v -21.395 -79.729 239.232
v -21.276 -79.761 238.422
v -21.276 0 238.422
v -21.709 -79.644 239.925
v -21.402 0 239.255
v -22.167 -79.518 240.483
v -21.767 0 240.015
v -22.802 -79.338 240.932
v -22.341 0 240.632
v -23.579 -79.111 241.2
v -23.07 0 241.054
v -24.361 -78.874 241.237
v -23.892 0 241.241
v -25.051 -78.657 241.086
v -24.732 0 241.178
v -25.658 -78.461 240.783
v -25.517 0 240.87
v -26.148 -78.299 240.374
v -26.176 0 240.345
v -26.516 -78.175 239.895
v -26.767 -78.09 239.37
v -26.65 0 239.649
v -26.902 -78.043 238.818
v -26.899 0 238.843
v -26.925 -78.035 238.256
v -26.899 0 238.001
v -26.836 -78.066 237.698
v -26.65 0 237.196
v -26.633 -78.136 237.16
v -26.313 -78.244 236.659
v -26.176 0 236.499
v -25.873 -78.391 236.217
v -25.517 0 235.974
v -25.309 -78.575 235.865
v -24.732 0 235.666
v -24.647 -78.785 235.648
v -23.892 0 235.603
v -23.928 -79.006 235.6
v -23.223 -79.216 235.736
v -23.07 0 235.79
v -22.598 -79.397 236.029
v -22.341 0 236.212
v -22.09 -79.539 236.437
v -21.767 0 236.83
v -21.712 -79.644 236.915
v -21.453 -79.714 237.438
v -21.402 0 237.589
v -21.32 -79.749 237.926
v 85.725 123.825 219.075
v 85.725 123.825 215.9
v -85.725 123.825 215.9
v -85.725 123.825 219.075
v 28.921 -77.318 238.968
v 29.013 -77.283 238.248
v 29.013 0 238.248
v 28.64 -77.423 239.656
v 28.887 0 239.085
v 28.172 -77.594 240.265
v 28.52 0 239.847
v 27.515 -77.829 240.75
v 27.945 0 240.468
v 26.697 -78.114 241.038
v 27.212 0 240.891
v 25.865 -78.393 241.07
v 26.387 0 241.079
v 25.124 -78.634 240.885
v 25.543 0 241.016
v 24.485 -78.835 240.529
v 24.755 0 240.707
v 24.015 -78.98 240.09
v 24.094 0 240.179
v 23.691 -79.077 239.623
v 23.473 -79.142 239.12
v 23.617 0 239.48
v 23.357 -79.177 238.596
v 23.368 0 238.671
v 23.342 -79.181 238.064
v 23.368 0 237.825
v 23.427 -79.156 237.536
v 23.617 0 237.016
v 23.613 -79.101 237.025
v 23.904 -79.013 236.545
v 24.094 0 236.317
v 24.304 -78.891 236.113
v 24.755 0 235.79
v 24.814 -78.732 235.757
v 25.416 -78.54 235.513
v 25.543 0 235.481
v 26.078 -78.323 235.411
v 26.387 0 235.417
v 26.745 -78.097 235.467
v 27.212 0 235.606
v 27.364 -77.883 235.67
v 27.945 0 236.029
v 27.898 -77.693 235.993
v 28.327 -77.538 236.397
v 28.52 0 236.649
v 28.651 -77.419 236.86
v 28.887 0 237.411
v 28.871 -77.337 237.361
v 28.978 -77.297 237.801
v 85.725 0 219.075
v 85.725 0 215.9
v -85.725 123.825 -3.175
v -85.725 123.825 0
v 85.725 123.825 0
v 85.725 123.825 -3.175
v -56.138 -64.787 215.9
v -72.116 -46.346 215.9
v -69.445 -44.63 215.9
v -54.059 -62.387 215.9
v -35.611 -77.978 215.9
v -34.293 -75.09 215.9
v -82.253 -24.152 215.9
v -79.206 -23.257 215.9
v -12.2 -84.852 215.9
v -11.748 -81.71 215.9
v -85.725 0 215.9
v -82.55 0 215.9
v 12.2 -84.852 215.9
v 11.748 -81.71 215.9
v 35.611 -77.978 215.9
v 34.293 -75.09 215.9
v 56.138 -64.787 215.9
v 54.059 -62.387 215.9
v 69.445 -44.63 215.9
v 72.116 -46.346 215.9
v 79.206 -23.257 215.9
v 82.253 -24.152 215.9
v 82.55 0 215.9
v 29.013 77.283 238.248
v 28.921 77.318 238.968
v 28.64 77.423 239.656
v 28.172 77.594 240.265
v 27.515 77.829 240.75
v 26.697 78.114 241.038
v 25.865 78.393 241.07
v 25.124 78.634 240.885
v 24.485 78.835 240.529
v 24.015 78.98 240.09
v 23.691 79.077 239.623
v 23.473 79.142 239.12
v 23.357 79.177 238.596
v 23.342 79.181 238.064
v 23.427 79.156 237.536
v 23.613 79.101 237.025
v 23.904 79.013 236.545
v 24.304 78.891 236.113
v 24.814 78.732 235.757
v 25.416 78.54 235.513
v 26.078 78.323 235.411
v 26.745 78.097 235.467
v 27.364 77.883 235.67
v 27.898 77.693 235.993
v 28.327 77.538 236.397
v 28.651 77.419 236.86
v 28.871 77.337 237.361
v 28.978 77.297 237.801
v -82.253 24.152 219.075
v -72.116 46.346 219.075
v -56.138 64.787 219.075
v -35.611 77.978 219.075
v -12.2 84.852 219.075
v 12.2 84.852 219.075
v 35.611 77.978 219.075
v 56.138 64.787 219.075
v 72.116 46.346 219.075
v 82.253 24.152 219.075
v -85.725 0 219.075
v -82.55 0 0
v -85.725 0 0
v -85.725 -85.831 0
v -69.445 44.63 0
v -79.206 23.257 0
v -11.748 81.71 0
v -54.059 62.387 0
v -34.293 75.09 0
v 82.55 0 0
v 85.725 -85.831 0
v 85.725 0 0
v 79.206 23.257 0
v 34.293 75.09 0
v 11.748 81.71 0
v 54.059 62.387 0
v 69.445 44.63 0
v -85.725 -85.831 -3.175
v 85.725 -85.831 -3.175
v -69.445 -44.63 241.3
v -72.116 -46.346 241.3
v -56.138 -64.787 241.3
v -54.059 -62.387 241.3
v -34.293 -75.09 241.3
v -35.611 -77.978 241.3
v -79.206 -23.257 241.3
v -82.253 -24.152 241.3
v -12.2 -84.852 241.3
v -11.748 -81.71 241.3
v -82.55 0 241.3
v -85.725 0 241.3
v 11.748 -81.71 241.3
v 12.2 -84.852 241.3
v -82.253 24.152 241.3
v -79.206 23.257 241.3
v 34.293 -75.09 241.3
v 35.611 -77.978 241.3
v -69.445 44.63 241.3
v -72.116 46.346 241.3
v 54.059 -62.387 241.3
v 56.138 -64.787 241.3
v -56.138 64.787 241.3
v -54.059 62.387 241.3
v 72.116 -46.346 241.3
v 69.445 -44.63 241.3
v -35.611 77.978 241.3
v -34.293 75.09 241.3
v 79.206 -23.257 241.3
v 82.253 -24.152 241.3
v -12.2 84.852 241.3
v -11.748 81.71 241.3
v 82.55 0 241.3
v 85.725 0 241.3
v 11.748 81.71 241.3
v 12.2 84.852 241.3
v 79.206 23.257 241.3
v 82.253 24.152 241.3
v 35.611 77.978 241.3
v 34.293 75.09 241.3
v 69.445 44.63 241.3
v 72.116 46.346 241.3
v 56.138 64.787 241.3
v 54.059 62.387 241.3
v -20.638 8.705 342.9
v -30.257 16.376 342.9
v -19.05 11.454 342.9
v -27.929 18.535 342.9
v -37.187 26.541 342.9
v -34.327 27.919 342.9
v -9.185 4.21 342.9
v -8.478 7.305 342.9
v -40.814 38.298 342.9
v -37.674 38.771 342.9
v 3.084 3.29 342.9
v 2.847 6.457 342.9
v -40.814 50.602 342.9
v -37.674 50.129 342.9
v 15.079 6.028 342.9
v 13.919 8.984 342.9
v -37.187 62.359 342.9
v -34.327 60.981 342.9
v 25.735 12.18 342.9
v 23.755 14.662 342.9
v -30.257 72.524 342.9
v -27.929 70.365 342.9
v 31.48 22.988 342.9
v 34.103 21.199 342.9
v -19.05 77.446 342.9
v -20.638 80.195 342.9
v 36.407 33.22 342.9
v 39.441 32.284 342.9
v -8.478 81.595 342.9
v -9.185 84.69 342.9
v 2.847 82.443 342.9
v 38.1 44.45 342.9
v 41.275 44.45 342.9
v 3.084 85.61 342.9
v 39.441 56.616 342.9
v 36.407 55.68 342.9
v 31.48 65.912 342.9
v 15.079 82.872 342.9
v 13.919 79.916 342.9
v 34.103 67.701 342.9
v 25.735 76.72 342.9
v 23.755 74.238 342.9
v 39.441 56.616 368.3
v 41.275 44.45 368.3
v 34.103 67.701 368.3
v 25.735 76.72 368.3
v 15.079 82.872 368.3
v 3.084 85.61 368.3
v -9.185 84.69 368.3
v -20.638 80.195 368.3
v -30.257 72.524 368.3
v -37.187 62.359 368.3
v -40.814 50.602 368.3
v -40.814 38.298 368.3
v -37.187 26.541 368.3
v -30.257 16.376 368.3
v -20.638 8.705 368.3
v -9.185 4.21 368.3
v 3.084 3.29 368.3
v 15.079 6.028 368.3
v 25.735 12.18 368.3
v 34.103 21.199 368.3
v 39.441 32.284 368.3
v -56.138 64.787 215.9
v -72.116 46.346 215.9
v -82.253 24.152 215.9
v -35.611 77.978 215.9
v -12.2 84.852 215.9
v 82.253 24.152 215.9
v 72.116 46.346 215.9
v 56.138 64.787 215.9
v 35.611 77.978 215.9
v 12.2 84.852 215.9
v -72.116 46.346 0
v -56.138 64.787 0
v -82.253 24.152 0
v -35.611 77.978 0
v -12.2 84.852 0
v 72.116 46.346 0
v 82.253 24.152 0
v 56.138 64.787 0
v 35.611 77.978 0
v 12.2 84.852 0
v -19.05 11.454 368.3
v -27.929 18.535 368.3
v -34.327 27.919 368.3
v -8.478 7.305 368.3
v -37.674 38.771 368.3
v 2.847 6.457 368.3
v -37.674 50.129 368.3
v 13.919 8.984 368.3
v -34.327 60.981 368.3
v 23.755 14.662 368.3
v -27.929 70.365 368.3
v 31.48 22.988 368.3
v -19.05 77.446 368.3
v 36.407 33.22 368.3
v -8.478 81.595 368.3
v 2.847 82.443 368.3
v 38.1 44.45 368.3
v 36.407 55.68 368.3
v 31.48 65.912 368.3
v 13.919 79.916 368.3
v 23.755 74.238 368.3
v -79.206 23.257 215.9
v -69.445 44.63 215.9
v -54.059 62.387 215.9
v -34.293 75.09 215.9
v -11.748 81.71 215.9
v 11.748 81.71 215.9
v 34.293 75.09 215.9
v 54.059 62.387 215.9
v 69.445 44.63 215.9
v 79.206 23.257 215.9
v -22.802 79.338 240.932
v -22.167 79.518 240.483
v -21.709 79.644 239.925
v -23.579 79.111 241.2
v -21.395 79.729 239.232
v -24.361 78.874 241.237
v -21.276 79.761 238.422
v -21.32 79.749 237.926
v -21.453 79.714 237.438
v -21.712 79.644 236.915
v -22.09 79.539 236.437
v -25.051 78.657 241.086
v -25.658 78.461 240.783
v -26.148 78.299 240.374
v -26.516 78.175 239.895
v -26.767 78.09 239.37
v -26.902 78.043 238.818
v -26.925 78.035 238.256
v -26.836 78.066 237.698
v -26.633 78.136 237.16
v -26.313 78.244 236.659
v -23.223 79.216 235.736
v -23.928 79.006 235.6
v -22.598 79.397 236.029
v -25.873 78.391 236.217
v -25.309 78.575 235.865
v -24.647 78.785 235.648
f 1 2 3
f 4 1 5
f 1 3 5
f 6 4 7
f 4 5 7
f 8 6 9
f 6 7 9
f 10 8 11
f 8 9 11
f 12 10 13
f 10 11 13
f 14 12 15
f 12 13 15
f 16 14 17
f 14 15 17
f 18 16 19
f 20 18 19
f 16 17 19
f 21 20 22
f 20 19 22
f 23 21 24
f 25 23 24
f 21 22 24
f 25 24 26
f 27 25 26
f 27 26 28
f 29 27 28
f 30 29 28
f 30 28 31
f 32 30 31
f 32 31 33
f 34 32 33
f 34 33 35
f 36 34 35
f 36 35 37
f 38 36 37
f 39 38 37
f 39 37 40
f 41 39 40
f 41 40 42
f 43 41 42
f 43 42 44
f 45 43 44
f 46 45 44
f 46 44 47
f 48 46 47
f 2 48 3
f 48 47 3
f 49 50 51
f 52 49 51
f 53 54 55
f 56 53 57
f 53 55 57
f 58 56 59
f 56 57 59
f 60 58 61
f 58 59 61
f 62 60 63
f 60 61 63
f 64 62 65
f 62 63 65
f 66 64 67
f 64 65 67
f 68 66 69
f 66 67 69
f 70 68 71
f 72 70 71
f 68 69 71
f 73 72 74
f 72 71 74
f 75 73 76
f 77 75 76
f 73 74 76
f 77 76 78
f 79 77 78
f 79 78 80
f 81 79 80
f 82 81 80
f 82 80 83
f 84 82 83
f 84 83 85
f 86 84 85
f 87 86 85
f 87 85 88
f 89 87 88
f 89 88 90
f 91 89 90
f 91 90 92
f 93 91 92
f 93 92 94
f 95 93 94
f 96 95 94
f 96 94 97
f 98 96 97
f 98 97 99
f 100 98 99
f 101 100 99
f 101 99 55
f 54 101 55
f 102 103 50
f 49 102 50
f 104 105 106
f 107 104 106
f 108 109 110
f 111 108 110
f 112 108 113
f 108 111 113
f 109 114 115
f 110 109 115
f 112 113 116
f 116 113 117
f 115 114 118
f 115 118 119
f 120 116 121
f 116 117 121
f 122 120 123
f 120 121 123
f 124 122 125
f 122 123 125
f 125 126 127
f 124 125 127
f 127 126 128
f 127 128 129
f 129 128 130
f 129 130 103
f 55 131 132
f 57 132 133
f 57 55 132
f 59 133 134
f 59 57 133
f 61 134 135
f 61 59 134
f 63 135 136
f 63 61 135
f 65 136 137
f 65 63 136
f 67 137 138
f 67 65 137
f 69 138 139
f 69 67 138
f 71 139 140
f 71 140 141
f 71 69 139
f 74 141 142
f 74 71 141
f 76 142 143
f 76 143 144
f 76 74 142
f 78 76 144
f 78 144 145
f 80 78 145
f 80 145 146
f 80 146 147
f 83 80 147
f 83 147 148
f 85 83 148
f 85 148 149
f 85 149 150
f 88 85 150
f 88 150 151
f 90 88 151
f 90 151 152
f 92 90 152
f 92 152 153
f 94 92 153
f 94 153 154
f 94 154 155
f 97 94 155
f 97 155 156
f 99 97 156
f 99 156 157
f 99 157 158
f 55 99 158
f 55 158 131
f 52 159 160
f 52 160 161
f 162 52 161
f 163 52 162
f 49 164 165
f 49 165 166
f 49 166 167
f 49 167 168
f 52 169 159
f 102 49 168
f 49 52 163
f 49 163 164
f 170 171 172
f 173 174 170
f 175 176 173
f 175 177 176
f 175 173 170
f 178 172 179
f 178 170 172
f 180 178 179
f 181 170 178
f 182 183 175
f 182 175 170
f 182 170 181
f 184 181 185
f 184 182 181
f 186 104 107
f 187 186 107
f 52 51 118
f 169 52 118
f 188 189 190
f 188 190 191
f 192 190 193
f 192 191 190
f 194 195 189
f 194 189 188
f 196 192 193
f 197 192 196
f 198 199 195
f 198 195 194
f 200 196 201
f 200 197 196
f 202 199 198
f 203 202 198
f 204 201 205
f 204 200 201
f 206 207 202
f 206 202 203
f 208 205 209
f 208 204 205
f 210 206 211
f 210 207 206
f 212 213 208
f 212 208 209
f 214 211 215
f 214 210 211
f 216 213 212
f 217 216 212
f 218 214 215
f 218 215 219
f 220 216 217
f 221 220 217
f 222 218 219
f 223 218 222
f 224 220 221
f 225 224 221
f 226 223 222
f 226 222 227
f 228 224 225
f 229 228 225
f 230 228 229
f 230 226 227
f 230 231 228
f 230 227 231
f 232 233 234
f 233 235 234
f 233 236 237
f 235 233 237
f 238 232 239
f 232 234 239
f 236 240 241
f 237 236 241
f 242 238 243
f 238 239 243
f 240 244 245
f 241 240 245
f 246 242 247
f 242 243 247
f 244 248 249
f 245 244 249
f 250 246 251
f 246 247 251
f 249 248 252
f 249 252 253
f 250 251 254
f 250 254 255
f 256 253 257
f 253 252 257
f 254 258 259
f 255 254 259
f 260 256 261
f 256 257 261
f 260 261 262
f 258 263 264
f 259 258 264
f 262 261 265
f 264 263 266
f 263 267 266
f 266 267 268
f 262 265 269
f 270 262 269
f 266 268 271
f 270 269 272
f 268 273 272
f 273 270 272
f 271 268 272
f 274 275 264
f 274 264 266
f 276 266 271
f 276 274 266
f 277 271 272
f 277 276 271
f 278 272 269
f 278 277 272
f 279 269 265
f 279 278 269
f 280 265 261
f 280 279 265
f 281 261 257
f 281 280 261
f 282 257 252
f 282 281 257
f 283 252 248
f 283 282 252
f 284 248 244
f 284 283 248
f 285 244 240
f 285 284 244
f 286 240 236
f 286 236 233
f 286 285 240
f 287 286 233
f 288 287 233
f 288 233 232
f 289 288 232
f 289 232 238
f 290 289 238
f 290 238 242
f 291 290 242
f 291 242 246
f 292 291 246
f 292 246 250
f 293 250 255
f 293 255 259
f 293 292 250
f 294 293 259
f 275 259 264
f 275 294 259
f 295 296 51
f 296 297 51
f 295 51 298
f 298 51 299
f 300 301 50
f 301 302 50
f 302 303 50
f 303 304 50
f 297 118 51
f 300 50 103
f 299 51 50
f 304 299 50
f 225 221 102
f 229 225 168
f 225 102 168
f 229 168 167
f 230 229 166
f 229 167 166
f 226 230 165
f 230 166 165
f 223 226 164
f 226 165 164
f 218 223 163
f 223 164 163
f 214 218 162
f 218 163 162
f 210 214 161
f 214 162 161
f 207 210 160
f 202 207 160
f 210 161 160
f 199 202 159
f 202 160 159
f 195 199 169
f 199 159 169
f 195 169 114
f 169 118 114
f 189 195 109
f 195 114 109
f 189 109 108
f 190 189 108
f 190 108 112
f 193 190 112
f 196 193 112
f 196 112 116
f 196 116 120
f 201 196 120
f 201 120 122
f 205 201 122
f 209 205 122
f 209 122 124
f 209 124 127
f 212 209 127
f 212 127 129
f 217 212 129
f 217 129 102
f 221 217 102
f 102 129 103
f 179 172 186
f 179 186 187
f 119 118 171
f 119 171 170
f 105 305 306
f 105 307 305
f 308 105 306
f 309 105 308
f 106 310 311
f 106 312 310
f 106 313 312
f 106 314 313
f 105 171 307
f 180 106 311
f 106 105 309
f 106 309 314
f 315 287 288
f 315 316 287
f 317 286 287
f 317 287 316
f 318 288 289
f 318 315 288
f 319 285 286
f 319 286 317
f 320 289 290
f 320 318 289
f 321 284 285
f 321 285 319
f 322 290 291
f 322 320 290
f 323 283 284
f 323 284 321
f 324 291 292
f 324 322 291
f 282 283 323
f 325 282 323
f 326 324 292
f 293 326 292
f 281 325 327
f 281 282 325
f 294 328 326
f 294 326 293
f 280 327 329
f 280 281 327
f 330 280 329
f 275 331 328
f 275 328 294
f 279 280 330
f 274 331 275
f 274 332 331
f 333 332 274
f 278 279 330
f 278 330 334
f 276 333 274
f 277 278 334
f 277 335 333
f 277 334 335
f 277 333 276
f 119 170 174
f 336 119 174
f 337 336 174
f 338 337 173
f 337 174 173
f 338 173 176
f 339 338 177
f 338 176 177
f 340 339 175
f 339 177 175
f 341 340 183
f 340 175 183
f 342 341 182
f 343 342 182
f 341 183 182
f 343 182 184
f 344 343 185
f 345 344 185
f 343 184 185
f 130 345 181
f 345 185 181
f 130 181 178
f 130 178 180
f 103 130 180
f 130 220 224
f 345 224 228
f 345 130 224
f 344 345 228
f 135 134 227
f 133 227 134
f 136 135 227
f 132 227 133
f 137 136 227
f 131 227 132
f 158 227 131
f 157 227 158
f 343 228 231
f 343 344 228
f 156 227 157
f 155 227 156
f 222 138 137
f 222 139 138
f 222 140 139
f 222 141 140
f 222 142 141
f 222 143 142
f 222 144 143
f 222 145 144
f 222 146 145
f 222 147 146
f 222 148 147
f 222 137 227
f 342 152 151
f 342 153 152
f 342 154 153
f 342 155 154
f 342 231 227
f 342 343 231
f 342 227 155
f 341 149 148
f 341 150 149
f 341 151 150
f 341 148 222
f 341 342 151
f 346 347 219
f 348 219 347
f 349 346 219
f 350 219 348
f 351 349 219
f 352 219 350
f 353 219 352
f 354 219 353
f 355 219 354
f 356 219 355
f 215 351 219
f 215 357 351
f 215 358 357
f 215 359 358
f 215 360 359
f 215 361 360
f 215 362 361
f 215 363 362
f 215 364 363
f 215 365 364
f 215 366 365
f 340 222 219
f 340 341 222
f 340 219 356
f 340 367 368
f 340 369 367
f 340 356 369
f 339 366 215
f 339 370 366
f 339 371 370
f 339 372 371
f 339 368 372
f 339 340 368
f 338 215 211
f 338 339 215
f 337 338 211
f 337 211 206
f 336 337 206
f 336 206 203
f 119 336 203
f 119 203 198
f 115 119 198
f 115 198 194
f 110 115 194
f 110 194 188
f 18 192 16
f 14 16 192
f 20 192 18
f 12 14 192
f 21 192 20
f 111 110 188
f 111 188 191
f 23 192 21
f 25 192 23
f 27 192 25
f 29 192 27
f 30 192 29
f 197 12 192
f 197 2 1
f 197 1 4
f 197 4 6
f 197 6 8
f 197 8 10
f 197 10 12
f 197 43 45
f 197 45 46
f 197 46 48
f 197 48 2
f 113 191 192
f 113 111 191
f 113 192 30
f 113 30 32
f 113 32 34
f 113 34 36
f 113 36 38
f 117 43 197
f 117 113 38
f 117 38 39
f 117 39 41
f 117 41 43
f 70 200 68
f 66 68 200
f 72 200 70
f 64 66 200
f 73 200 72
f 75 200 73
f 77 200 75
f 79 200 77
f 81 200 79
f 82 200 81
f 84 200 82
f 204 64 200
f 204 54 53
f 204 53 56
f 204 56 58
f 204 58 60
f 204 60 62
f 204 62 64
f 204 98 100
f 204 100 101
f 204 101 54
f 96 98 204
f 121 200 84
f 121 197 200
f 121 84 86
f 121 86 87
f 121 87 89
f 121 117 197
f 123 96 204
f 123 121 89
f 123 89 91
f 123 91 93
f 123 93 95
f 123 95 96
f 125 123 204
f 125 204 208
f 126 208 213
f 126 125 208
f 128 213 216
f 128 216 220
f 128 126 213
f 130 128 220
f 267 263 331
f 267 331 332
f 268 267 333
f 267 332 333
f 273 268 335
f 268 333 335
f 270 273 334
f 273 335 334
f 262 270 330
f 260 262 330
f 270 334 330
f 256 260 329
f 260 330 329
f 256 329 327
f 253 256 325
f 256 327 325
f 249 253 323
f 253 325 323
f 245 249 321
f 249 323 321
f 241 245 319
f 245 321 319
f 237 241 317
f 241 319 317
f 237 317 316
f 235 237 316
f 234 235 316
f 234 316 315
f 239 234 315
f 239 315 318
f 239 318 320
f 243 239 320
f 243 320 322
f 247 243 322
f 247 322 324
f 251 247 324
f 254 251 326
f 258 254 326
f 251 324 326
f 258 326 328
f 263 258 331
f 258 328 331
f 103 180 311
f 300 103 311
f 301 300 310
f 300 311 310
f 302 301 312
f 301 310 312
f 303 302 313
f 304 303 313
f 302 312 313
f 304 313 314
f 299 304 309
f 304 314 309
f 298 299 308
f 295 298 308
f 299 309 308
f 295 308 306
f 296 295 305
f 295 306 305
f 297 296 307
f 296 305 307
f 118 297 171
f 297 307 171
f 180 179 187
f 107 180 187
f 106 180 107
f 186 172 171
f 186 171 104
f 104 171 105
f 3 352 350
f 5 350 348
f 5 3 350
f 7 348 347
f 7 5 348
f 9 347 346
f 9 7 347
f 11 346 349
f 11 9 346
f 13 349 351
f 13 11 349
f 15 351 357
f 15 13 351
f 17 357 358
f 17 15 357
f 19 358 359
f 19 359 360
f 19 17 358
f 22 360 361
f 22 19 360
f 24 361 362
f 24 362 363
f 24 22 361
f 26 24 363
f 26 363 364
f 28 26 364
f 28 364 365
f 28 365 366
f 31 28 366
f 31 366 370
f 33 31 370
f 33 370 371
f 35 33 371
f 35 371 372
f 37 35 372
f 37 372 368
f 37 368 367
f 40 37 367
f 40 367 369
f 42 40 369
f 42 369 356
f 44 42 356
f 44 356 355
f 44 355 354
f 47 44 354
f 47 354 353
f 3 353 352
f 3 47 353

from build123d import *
from build123d import SkipClean  # not in build123d's __all__

# Parameters (mm, degrees)
F1_DEPTH       = 215.9
F2_W           = 171.45
F2_H           = 247.65
F3_DEPTH       = 3.175
F4_W           = 171.45
F4_H           = 37.9944009304
F5_DEPTH       = 25.4
F7_R           = 85.725
F7_R_2         = 82.55
F9_DEPTH       = 25.4
F10_R          = 41.275
F10_R_2        = 38.1
F11_DEPTH      = 25.4
F13_DEPTH      = 3.175
F14_R          = 2.8270786392
F14_R_2        = 2.8387354089
F15_DEPTH      = 79.7610810168
F15_DEPTH_BACK = 79.7610810168


# Not quite as in the source:
# - after a boolean that leaves OpenCascade's solid faulty, fix() repairs it


with BuildPart() as f1:
    # F0 (on Top) → F1 (new body)
    with BuildSketch(Plane.XY):
        with BuildLine():
            ThreePointArc((-82.55, 0), (0, 82.55), (82.55, 0))
            Line((82.55, 0), (85.725, 0))
            ThreePointArc((85.725, 0), (0, 85.725), (-85.725, 0))
            Line((-85.725, 0), (-82.55, 0))
        make_face()
    extrude(amount=F1_DEPTH)

    # F2 (on Top) → F3 (join)
    with BuildSketch(Plane.XY):
        Rectangle(F2_W, F2_H)
    extrude(amount=-F3_DEPTH)

    # F4 (on face) → F5 (cut)
    with BuildSketch(Plane.XY):
        with Locations((0, -104.8277995348)):
            Rectangle(F4_W, F4_H)
    extrude(amount=-F5_DEPTH, mode=Mode.SUBTRACT)

    # F7 (on offset) → F9 (join)
    with BuildSketch(Plane.XY.offset(215.9)):
        Circle(F7_R)
        Circle(F7_R_2, mode=Mode.SUBTRACT)
    with SkipClean():  # cleaning this boolean's faces spoils the solid; the shape is the same uncleaned
        extrude(amount=F9_DEPTH)

    # F12 (on offset) → F13 (join)
    with BuildSketch(Plane.XY.offset(215.9)):
        with BuildLine():
            Line((-85.725, 123.825), (-85.725, 0))
            ThreePointArc((-85.725, 0), (0, 85.725), (85.725, 0))
            Line((85.725, 0), (85.725, 123.825))
            Line((85.725, 123.825), (-85.725, 123.825))
        make_face()
    extrude(amount=F13_DEPTH)

    add(f1.part.fix(), mode=Mode.REPLACE)

    # F14 (on Front) → F15 (join, two sides)
    with BuildSketch(Plane.XZ) as f15_sk:
        with Locations((-24.103179574, 238.4221255779)):
            Circle(F14_R)
        with Locations((26.1746887118, 238.2481247187)):
            Circle(F14_R_2)
    extrude(amount=F15_DEPTH)
    extrude(f15_sk.sketch, amount=-F15_DEPTH_BACK)


with BuildPart() as f11:
    # F10 (on offset) → F11 (new body)
    with BuildSketch(Plane.XY.offset(368.3)):
        with Locations((0, 44.45)):
            Circle(F10_R)
        with Locations((0, 44.45)):
            Circle(F10_R_2, mode=Mode.SUBTRACT)
    extrude(amount=-F11_DEPTH)


solid = Compound([f1.part, f11.part])
